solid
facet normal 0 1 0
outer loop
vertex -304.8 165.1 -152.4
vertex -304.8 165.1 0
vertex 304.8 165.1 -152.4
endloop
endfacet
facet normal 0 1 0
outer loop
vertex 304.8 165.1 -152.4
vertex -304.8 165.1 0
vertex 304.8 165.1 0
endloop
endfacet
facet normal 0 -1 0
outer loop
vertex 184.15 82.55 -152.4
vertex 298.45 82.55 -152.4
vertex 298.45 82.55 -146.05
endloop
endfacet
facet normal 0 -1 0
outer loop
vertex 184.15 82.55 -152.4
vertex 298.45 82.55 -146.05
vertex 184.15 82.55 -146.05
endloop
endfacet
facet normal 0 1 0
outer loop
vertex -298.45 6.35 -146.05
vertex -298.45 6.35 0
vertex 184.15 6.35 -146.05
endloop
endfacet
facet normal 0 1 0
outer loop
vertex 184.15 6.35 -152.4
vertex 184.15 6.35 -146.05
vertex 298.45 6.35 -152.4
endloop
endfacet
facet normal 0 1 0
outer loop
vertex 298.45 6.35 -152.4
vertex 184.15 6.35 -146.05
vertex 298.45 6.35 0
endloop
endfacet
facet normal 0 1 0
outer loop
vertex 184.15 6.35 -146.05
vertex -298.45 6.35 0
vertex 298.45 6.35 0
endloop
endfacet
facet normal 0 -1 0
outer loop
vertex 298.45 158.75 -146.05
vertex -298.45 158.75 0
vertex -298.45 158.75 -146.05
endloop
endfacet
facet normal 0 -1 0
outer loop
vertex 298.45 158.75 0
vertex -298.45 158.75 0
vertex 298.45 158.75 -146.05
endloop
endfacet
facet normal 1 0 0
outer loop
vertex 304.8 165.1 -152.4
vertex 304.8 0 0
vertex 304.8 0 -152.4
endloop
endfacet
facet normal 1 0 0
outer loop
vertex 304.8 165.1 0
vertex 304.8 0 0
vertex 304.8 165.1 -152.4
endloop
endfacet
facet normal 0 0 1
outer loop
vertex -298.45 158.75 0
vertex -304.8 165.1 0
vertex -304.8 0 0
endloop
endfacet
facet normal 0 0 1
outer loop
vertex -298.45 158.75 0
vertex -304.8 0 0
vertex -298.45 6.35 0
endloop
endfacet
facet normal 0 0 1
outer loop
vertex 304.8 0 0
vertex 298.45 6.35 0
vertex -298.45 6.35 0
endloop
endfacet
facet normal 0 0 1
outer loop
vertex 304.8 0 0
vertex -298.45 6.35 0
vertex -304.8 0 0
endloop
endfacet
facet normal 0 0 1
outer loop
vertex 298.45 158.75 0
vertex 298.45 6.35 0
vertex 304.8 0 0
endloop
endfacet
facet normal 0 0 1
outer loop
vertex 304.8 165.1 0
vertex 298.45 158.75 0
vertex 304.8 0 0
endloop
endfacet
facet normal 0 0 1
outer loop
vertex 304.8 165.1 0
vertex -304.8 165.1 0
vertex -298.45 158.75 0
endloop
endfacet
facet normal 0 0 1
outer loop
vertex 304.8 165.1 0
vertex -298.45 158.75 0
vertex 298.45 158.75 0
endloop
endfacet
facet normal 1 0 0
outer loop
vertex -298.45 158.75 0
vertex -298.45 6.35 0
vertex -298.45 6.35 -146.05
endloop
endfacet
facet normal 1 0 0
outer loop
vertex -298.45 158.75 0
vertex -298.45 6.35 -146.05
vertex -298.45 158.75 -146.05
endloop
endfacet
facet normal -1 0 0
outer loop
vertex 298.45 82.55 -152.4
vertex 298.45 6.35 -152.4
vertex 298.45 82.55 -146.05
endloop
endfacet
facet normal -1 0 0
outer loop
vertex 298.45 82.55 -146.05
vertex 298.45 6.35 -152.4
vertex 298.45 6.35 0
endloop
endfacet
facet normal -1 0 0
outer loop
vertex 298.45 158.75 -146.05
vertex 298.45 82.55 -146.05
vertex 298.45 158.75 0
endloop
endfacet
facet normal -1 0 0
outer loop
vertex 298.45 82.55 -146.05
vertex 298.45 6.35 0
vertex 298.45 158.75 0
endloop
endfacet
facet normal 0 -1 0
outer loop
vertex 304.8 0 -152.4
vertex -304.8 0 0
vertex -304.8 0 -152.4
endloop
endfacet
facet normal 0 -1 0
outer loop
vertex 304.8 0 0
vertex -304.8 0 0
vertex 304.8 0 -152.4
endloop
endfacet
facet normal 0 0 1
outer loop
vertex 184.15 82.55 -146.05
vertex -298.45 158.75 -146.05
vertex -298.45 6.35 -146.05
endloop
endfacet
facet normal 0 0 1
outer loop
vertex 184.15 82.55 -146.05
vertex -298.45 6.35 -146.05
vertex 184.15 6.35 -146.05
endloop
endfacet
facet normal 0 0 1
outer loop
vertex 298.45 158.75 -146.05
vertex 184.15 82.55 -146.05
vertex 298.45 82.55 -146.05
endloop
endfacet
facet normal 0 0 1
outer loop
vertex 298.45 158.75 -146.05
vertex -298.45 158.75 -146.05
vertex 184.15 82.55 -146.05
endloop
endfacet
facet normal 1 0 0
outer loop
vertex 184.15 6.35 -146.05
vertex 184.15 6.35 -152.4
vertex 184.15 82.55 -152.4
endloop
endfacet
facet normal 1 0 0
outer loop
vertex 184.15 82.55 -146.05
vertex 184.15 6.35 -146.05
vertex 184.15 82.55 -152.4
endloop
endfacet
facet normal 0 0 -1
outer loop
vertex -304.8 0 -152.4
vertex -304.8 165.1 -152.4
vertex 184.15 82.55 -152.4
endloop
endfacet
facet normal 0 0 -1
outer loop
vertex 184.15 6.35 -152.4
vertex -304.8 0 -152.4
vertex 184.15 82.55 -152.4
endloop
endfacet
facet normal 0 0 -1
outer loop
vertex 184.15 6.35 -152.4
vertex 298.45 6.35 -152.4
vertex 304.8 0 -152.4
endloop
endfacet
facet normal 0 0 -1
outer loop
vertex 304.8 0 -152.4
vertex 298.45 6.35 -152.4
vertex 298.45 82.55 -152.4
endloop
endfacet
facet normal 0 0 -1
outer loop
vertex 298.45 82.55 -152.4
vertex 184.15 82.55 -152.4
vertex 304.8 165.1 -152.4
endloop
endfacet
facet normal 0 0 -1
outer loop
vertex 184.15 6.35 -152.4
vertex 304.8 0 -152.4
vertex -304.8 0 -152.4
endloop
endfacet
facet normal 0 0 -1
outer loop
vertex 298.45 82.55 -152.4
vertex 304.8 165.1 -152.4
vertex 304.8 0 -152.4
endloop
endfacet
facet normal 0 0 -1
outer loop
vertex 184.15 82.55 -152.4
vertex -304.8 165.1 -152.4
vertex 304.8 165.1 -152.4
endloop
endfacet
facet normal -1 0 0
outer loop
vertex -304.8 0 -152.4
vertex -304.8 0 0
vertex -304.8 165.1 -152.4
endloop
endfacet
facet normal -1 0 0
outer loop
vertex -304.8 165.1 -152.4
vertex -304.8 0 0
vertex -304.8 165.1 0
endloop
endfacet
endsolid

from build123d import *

# Parameters (mm, degrees)
SKETCH1_W           = 609.6
SKETCH1_H           = 165.1
BOSS_EXTRUDE1_DEPTH = 152.4
SHELL1_T            = -6.35
SKETCH4_W           = 114.3
SKETCH4_H           = 76.2
CUT_EXTRUDE1_DEPTH  = 6.35


with BuildPart() as part:
    # Sketch1 → Boss-Extrude1 (new body)
    with BuildSketch(Plane.XY):
        with Locations((0, 82.55)):
            Rectangle(SKETCH1_W, SKETCH1_H)
    extrude(amount=-BOSS_EXTRUDE1_DEPTH)

    # Shell1
    shell1_openings = [part.faces().sort_by_distance(p)[0] for p in [
        (0, 82.55, 0),
    ]]
    offset(amount=SHELL1_T, openings=shell1_openings, kind=Kind.INTERSECTION)

    # Sketch4 → Cut-Extrude1 (cut)
    with BuildSketch(Plane(origin=(0, 0, -152.4), x_dir=(-1, 0, 0), z_dir=(0, 0, -1))):
        with Locations((-241.3, 44.45)):
            Rectangle(SKETCH4_W, SKETCH4_H)
    extrude(amount=-CUT_EXTRUDE1_DEPTH, mode=Mode.SUBTRACT)


solid = part.part
